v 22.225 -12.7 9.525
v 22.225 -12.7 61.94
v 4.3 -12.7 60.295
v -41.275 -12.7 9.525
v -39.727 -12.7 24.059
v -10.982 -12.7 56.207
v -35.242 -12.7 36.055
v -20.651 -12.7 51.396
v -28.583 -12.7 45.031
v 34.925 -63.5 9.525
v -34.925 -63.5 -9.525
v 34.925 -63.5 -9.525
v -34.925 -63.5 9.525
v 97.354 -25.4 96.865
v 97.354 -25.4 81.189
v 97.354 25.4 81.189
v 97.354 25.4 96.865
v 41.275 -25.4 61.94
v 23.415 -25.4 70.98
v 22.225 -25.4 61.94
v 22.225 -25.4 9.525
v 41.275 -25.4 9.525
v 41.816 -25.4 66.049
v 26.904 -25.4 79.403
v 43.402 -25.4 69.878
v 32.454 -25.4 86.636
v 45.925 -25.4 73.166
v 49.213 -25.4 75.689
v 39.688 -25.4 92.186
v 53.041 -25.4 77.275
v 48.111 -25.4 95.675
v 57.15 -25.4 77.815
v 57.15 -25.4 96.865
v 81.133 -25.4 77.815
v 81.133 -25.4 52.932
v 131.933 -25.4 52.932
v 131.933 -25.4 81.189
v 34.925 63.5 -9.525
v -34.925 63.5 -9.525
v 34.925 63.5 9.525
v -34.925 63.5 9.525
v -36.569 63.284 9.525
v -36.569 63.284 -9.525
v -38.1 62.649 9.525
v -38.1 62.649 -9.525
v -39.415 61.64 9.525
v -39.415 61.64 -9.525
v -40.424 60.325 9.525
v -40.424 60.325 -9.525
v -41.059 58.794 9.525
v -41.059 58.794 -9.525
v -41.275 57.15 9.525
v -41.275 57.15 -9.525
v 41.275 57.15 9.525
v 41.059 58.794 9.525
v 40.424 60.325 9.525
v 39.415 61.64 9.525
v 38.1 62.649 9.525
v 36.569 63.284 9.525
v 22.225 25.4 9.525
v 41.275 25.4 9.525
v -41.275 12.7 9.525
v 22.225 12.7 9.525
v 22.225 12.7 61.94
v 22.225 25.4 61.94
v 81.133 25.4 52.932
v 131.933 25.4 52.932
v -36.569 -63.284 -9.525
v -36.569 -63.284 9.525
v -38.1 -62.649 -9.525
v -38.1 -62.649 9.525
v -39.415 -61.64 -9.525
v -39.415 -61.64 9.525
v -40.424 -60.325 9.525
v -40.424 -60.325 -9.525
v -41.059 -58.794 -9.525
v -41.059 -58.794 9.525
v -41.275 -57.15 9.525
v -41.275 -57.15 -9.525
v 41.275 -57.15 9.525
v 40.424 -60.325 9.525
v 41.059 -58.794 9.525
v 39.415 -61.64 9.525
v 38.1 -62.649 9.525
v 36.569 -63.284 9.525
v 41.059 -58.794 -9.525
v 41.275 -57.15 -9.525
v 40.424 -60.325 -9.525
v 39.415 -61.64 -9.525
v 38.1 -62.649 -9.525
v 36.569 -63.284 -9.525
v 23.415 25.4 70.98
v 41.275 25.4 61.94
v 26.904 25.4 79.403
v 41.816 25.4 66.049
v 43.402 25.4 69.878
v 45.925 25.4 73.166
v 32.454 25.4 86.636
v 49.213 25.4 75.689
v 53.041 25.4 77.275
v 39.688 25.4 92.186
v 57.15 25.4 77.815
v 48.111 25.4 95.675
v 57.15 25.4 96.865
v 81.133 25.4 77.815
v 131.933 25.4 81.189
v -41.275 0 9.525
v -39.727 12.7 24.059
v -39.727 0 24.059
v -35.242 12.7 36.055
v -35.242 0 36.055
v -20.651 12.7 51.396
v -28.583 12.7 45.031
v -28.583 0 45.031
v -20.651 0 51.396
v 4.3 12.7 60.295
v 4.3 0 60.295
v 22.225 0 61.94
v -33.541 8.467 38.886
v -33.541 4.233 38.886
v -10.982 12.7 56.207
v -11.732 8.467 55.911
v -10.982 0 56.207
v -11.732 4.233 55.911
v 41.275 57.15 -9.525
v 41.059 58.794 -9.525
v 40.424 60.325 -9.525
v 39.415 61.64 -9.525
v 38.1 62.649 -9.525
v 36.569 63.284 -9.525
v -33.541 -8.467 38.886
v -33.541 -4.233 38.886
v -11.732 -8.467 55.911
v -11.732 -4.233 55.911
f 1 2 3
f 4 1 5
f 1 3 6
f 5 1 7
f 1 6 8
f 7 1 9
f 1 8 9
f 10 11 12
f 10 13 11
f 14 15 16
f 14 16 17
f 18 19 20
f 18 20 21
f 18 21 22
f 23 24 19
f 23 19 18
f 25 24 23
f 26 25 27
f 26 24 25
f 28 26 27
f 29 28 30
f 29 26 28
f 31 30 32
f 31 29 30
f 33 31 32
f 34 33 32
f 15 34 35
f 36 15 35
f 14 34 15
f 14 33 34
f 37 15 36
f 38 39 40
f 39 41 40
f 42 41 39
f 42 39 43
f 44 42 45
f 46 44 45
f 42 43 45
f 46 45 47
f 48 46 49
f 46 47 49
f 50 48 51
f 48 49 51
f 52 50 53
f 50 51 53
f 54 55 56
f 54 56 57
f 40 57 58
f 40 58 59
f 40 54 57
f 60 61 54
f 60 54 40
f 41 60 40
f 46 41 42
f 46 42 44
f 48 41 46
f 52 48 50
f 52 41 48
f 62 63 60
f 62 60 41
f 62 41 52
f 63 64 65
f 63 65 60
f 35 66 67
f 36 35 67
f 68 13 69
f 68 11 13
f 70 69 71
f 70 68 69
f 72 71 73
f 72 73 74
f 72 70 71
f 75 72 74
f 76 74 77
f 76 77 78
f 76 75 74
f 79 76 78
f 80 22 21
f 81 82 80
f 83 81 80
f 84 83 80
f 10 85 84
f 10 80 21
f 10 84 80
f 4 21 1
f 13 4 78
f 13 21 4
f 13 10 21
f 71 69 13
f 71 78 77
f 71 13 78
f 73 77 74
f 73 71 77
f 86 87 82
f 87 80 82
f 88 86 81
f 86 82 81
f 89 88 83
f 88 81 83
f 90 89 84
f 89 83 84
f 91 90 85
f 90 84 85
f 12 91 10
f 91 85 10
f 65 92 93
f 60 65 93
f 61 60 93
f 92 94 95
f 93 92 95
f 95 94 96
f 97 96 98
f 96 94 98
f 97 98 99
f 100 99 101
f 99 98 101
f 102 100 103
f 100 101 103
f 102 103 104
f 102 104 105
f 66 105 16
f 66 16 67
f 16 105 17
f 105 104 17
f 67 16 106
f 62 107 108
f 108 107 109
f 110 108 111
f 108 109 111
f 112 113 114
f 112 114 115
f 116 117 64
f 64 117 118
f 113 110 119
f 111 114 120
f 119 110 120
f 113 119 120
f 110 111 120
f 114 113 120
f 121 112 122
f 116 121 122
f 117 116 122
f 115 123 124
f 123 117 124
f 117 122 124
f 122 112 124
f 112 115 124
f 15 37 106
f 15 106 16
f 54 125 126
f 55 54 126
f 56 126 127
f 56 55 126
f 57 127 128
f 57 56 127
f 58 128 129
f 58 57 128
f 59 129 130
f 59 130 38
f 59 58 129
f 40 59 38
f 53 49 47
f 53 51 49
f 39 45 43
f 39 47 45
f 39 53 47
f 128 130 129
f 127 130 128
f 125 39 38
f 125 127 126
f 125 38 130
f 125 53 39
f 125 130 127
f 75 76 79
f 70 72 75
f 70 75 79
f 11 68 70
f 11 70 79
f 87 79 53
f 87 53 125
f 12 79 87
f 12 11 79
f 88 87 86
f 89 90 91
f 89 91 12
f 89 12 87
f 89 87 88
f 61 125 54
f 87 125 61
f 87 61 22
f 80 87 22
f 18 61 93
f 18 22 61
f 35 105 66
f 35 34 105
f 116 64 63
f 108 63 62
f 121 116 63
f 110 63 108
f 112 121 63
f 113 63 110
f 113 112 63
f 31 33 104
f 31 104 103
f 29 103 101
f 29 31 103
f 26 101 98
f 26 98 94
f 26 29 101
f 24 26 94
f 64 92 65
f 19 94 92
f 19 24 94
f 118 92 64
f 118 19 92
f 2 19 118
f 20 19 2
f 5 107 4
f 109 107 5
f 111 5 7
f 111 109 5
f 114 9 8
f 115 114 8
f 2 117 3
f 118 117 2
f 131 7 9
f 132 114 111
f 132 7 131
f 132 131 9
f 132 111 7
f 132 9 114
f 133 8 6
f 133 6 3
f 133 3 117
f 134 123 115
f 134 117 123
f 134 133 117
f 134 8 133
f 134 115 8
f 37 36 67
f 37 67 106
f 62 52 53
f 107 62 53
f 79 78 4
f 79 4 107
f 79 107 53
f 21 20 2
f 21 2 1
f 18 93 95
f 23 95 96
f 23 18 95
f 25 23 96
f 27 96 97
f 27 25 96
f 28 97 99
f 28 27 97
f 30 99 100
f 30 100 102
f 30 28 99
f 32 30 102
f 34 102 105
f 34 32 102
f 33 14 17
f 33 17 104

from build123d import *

# Parameters (mm, degrees)
F1_DEPTH = 63.5
F0_W     = 16.2215043542
F0_H     = 3.3740014491
F2_DEPTH = 25.4
F3_DEPTH = 12.7
F4_R     = 6.35


with BuildPart() as f1:
    # F0 (on Front) → F1 (new body, symmetric)
    with BuildSketch(Plane.XZ):
        Polygon((-41.275, -9.525), (41.275, -9.525), (41.275, 9.525), (22.225, 9.525), (-41.275, 9.525), align=None)
    extrude(amount=F1_DEPTH, both=True)

    # F0 (on Front) → F2 (join, symmetric)
    with BuildSketch(Plane.XZ):
        Polygon((97.3541051817, 77.81544), (81.1326008275, 77.81544), (81.1326008275, 52.9319414491), (131.9326008275, 52.9319414491), (131.9326008275, 81.1894414491), (97.3541051817, 81.1894414491), align=None)
        Polygon((-41.275, -9.525), (41.275, -9.525), (41.275, 9.525), (22.225, 9.525), (-41.275, 9.525), align=None)
        with Locations((89.2433530046, 79.5024407246)):
            Rectangle(F0_W, F0_H)
        with BuildLine():
            Line((22.225, 9.525), (41.275, 9.525))
            Line((41.275, 9.525), (41.275, 61.94044))
            ThreePointArc((41.275, 61.94044), (45.9246798487, 73.1657601513), (57.15, 77.81544))
            Line((57.15, 77.81544), (81.1326008275, 77.81544))
            Line((81.1326008275, 77.81544), (81.1326008275, 81.1894414491))
            Line((81.1326008275, 81.1894414491), (97.3541051817, 81.1894414491))
            Line((97.3541051817, 81.1894414491), (97.3541051817, 96.86544))
            Line((97.3541051817, 96.86544), (57.15, 96.86544))
            ThreePointArc((57.15, 96.86544), (32.4542956671, 86.6361443329), (22.225, 61.94044))
            Line((22.225, 61.94044), (22.225, 9.525))
        make_face()
    extrude(amount=F2_DEPTH, both=True)

    # F0 (on Front) → F3 (join, symmetric)
    with BuildSketch(Plane.XZ):
        with BuildLine():
            add(Edge.make_bspline(
                [(-41.275, 9.525), (-41.2206873298, 45.4989261925), (-17.1644557267, 60.9636493027), (22.225, 61.94044)],
                knots=[0, 0, 0, 0, 82.3384985921, 82.3384985921, 82.3384985921, 82.3384985921], degree=3))
            Line((-41.275, 9.525), (22.225, 9.525))
            Line((22.225, 9.525), (22.225, 61.94044))
        make_face()
    extrude(amount=F3_DEPTH, both=True)

    # F4
    f4_edges = [f1.edges().sort_by_distance(p)[0] for p in [
        (41.275, -63.5, 0),
        (-41.275, -63.5, 0),
        (41.275, 63.5, 0),
        (-41.275, 63.5, 0),
    ]]
    fillet(f4_edges, radius=F4_R)


solid = f1.part
